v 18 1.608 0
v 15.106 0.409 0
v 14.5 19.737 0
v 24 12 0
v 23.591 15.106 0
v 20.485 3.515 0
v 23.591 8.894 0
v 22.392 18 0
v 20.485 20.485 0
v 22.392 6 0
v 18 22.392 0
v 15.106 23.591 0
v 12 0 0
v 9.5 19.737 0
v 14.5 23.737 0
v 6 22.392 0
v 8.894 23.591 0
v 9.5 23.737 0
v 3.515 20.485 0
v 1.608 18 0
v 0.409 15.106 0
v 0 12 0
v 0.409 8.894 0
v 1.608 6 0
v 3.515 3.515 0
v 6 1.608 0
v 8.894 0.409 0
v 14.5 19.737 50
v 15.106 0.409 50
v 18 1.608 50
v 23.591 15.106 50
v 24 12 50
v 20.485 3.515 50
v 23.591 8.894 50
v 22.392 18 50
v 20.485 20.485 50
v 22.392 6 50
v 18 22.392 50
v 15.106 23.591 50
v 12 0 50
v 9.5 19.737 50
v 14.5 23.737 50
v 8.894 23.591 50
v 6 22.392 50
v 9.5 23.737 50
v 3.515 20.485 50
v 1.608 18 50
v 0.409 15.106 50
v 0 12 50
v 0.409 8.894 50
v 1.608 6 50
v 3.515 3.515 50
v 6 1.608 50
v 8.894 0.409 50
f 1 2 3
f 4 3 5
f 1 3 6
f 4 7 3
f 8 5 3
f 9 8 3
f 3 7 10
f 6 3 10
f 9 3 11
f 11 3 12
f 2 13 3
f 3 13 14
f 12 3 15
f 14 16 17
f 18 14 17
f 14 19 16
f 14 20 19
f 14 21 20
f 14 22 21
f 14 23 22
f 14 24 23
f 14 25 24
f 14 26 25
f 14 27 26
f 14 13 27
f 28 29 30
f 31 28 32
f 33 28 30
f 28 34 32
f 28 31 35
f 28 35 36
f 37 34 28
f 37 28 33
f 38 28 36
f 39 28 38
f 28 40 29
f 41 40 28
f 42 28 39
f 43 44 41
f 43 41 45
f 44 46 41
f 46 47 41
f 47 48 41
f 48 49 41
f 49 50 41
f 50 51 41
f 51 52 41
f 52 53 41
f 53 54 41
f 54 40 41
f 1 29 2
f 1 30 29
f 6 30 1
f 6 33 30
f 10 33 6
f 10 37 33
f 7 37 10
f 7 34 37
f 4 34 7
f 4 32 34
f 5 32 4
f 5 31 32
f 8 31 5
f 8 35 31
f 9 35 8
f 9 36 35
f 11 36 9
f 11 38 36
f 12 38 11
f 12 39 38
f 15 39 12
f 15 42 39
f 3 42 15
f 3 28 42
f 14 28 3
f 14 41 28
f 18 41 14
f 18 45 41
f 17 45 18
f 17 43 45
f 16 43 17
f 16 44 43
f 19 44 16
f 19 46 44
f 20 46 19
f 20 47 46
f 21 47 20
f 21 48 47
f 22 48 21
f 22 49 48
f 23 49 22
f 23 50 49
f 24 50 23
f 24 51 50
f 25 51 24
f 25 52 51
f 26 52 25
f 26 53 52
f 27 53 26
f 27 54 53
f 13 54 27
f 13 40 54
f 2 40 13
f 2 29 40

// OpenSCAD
$fn = 32;

// ----------------------------------------------------------------------
// Keyway shaft: d24 shaft, key 5 x 4 mm
// ----------------------------------------------------------------------

// --- parameters (mm) ---
shaft_r = 12;             // shaft radius
key_w = 5;                // keyway width
key_d = 4;                // keyway depth below the surface line
plate_t = 50;             // shaft length, Z (extrusion height)

shaft_d = 2 * shaft_r;  // shaft diameter
circle_step = 15;  // polygon sampling step, degrees

profile = [[8.894, 23.591], [6, 22.392], [3.515, 20.485], [1.608, 18], [0.409, 15.106], [0, 12], [0.409, 8.894], [1.608, 6], [3.515, 3.515], [6, 1.608], [8.894, 0.409], [12, 0], [15.106, 0.409], [18, 1.608], [20.485, 3.515], [22.392, 6], [23.591, 8.894], [24, 12], [23.591, 15.106], [22.392, 18], [20.485, 20.485], [18, 22.392], [15.106, 23.591], [14.5, 23.737], [14.5, 19.737], [9.5, 19.737], [9.5, 23.737]];  // primary outline, 27 points, counter clockwise

// --- the one profile operation ---
linear_extrude(height = plate_t) polygon(points = profile);
